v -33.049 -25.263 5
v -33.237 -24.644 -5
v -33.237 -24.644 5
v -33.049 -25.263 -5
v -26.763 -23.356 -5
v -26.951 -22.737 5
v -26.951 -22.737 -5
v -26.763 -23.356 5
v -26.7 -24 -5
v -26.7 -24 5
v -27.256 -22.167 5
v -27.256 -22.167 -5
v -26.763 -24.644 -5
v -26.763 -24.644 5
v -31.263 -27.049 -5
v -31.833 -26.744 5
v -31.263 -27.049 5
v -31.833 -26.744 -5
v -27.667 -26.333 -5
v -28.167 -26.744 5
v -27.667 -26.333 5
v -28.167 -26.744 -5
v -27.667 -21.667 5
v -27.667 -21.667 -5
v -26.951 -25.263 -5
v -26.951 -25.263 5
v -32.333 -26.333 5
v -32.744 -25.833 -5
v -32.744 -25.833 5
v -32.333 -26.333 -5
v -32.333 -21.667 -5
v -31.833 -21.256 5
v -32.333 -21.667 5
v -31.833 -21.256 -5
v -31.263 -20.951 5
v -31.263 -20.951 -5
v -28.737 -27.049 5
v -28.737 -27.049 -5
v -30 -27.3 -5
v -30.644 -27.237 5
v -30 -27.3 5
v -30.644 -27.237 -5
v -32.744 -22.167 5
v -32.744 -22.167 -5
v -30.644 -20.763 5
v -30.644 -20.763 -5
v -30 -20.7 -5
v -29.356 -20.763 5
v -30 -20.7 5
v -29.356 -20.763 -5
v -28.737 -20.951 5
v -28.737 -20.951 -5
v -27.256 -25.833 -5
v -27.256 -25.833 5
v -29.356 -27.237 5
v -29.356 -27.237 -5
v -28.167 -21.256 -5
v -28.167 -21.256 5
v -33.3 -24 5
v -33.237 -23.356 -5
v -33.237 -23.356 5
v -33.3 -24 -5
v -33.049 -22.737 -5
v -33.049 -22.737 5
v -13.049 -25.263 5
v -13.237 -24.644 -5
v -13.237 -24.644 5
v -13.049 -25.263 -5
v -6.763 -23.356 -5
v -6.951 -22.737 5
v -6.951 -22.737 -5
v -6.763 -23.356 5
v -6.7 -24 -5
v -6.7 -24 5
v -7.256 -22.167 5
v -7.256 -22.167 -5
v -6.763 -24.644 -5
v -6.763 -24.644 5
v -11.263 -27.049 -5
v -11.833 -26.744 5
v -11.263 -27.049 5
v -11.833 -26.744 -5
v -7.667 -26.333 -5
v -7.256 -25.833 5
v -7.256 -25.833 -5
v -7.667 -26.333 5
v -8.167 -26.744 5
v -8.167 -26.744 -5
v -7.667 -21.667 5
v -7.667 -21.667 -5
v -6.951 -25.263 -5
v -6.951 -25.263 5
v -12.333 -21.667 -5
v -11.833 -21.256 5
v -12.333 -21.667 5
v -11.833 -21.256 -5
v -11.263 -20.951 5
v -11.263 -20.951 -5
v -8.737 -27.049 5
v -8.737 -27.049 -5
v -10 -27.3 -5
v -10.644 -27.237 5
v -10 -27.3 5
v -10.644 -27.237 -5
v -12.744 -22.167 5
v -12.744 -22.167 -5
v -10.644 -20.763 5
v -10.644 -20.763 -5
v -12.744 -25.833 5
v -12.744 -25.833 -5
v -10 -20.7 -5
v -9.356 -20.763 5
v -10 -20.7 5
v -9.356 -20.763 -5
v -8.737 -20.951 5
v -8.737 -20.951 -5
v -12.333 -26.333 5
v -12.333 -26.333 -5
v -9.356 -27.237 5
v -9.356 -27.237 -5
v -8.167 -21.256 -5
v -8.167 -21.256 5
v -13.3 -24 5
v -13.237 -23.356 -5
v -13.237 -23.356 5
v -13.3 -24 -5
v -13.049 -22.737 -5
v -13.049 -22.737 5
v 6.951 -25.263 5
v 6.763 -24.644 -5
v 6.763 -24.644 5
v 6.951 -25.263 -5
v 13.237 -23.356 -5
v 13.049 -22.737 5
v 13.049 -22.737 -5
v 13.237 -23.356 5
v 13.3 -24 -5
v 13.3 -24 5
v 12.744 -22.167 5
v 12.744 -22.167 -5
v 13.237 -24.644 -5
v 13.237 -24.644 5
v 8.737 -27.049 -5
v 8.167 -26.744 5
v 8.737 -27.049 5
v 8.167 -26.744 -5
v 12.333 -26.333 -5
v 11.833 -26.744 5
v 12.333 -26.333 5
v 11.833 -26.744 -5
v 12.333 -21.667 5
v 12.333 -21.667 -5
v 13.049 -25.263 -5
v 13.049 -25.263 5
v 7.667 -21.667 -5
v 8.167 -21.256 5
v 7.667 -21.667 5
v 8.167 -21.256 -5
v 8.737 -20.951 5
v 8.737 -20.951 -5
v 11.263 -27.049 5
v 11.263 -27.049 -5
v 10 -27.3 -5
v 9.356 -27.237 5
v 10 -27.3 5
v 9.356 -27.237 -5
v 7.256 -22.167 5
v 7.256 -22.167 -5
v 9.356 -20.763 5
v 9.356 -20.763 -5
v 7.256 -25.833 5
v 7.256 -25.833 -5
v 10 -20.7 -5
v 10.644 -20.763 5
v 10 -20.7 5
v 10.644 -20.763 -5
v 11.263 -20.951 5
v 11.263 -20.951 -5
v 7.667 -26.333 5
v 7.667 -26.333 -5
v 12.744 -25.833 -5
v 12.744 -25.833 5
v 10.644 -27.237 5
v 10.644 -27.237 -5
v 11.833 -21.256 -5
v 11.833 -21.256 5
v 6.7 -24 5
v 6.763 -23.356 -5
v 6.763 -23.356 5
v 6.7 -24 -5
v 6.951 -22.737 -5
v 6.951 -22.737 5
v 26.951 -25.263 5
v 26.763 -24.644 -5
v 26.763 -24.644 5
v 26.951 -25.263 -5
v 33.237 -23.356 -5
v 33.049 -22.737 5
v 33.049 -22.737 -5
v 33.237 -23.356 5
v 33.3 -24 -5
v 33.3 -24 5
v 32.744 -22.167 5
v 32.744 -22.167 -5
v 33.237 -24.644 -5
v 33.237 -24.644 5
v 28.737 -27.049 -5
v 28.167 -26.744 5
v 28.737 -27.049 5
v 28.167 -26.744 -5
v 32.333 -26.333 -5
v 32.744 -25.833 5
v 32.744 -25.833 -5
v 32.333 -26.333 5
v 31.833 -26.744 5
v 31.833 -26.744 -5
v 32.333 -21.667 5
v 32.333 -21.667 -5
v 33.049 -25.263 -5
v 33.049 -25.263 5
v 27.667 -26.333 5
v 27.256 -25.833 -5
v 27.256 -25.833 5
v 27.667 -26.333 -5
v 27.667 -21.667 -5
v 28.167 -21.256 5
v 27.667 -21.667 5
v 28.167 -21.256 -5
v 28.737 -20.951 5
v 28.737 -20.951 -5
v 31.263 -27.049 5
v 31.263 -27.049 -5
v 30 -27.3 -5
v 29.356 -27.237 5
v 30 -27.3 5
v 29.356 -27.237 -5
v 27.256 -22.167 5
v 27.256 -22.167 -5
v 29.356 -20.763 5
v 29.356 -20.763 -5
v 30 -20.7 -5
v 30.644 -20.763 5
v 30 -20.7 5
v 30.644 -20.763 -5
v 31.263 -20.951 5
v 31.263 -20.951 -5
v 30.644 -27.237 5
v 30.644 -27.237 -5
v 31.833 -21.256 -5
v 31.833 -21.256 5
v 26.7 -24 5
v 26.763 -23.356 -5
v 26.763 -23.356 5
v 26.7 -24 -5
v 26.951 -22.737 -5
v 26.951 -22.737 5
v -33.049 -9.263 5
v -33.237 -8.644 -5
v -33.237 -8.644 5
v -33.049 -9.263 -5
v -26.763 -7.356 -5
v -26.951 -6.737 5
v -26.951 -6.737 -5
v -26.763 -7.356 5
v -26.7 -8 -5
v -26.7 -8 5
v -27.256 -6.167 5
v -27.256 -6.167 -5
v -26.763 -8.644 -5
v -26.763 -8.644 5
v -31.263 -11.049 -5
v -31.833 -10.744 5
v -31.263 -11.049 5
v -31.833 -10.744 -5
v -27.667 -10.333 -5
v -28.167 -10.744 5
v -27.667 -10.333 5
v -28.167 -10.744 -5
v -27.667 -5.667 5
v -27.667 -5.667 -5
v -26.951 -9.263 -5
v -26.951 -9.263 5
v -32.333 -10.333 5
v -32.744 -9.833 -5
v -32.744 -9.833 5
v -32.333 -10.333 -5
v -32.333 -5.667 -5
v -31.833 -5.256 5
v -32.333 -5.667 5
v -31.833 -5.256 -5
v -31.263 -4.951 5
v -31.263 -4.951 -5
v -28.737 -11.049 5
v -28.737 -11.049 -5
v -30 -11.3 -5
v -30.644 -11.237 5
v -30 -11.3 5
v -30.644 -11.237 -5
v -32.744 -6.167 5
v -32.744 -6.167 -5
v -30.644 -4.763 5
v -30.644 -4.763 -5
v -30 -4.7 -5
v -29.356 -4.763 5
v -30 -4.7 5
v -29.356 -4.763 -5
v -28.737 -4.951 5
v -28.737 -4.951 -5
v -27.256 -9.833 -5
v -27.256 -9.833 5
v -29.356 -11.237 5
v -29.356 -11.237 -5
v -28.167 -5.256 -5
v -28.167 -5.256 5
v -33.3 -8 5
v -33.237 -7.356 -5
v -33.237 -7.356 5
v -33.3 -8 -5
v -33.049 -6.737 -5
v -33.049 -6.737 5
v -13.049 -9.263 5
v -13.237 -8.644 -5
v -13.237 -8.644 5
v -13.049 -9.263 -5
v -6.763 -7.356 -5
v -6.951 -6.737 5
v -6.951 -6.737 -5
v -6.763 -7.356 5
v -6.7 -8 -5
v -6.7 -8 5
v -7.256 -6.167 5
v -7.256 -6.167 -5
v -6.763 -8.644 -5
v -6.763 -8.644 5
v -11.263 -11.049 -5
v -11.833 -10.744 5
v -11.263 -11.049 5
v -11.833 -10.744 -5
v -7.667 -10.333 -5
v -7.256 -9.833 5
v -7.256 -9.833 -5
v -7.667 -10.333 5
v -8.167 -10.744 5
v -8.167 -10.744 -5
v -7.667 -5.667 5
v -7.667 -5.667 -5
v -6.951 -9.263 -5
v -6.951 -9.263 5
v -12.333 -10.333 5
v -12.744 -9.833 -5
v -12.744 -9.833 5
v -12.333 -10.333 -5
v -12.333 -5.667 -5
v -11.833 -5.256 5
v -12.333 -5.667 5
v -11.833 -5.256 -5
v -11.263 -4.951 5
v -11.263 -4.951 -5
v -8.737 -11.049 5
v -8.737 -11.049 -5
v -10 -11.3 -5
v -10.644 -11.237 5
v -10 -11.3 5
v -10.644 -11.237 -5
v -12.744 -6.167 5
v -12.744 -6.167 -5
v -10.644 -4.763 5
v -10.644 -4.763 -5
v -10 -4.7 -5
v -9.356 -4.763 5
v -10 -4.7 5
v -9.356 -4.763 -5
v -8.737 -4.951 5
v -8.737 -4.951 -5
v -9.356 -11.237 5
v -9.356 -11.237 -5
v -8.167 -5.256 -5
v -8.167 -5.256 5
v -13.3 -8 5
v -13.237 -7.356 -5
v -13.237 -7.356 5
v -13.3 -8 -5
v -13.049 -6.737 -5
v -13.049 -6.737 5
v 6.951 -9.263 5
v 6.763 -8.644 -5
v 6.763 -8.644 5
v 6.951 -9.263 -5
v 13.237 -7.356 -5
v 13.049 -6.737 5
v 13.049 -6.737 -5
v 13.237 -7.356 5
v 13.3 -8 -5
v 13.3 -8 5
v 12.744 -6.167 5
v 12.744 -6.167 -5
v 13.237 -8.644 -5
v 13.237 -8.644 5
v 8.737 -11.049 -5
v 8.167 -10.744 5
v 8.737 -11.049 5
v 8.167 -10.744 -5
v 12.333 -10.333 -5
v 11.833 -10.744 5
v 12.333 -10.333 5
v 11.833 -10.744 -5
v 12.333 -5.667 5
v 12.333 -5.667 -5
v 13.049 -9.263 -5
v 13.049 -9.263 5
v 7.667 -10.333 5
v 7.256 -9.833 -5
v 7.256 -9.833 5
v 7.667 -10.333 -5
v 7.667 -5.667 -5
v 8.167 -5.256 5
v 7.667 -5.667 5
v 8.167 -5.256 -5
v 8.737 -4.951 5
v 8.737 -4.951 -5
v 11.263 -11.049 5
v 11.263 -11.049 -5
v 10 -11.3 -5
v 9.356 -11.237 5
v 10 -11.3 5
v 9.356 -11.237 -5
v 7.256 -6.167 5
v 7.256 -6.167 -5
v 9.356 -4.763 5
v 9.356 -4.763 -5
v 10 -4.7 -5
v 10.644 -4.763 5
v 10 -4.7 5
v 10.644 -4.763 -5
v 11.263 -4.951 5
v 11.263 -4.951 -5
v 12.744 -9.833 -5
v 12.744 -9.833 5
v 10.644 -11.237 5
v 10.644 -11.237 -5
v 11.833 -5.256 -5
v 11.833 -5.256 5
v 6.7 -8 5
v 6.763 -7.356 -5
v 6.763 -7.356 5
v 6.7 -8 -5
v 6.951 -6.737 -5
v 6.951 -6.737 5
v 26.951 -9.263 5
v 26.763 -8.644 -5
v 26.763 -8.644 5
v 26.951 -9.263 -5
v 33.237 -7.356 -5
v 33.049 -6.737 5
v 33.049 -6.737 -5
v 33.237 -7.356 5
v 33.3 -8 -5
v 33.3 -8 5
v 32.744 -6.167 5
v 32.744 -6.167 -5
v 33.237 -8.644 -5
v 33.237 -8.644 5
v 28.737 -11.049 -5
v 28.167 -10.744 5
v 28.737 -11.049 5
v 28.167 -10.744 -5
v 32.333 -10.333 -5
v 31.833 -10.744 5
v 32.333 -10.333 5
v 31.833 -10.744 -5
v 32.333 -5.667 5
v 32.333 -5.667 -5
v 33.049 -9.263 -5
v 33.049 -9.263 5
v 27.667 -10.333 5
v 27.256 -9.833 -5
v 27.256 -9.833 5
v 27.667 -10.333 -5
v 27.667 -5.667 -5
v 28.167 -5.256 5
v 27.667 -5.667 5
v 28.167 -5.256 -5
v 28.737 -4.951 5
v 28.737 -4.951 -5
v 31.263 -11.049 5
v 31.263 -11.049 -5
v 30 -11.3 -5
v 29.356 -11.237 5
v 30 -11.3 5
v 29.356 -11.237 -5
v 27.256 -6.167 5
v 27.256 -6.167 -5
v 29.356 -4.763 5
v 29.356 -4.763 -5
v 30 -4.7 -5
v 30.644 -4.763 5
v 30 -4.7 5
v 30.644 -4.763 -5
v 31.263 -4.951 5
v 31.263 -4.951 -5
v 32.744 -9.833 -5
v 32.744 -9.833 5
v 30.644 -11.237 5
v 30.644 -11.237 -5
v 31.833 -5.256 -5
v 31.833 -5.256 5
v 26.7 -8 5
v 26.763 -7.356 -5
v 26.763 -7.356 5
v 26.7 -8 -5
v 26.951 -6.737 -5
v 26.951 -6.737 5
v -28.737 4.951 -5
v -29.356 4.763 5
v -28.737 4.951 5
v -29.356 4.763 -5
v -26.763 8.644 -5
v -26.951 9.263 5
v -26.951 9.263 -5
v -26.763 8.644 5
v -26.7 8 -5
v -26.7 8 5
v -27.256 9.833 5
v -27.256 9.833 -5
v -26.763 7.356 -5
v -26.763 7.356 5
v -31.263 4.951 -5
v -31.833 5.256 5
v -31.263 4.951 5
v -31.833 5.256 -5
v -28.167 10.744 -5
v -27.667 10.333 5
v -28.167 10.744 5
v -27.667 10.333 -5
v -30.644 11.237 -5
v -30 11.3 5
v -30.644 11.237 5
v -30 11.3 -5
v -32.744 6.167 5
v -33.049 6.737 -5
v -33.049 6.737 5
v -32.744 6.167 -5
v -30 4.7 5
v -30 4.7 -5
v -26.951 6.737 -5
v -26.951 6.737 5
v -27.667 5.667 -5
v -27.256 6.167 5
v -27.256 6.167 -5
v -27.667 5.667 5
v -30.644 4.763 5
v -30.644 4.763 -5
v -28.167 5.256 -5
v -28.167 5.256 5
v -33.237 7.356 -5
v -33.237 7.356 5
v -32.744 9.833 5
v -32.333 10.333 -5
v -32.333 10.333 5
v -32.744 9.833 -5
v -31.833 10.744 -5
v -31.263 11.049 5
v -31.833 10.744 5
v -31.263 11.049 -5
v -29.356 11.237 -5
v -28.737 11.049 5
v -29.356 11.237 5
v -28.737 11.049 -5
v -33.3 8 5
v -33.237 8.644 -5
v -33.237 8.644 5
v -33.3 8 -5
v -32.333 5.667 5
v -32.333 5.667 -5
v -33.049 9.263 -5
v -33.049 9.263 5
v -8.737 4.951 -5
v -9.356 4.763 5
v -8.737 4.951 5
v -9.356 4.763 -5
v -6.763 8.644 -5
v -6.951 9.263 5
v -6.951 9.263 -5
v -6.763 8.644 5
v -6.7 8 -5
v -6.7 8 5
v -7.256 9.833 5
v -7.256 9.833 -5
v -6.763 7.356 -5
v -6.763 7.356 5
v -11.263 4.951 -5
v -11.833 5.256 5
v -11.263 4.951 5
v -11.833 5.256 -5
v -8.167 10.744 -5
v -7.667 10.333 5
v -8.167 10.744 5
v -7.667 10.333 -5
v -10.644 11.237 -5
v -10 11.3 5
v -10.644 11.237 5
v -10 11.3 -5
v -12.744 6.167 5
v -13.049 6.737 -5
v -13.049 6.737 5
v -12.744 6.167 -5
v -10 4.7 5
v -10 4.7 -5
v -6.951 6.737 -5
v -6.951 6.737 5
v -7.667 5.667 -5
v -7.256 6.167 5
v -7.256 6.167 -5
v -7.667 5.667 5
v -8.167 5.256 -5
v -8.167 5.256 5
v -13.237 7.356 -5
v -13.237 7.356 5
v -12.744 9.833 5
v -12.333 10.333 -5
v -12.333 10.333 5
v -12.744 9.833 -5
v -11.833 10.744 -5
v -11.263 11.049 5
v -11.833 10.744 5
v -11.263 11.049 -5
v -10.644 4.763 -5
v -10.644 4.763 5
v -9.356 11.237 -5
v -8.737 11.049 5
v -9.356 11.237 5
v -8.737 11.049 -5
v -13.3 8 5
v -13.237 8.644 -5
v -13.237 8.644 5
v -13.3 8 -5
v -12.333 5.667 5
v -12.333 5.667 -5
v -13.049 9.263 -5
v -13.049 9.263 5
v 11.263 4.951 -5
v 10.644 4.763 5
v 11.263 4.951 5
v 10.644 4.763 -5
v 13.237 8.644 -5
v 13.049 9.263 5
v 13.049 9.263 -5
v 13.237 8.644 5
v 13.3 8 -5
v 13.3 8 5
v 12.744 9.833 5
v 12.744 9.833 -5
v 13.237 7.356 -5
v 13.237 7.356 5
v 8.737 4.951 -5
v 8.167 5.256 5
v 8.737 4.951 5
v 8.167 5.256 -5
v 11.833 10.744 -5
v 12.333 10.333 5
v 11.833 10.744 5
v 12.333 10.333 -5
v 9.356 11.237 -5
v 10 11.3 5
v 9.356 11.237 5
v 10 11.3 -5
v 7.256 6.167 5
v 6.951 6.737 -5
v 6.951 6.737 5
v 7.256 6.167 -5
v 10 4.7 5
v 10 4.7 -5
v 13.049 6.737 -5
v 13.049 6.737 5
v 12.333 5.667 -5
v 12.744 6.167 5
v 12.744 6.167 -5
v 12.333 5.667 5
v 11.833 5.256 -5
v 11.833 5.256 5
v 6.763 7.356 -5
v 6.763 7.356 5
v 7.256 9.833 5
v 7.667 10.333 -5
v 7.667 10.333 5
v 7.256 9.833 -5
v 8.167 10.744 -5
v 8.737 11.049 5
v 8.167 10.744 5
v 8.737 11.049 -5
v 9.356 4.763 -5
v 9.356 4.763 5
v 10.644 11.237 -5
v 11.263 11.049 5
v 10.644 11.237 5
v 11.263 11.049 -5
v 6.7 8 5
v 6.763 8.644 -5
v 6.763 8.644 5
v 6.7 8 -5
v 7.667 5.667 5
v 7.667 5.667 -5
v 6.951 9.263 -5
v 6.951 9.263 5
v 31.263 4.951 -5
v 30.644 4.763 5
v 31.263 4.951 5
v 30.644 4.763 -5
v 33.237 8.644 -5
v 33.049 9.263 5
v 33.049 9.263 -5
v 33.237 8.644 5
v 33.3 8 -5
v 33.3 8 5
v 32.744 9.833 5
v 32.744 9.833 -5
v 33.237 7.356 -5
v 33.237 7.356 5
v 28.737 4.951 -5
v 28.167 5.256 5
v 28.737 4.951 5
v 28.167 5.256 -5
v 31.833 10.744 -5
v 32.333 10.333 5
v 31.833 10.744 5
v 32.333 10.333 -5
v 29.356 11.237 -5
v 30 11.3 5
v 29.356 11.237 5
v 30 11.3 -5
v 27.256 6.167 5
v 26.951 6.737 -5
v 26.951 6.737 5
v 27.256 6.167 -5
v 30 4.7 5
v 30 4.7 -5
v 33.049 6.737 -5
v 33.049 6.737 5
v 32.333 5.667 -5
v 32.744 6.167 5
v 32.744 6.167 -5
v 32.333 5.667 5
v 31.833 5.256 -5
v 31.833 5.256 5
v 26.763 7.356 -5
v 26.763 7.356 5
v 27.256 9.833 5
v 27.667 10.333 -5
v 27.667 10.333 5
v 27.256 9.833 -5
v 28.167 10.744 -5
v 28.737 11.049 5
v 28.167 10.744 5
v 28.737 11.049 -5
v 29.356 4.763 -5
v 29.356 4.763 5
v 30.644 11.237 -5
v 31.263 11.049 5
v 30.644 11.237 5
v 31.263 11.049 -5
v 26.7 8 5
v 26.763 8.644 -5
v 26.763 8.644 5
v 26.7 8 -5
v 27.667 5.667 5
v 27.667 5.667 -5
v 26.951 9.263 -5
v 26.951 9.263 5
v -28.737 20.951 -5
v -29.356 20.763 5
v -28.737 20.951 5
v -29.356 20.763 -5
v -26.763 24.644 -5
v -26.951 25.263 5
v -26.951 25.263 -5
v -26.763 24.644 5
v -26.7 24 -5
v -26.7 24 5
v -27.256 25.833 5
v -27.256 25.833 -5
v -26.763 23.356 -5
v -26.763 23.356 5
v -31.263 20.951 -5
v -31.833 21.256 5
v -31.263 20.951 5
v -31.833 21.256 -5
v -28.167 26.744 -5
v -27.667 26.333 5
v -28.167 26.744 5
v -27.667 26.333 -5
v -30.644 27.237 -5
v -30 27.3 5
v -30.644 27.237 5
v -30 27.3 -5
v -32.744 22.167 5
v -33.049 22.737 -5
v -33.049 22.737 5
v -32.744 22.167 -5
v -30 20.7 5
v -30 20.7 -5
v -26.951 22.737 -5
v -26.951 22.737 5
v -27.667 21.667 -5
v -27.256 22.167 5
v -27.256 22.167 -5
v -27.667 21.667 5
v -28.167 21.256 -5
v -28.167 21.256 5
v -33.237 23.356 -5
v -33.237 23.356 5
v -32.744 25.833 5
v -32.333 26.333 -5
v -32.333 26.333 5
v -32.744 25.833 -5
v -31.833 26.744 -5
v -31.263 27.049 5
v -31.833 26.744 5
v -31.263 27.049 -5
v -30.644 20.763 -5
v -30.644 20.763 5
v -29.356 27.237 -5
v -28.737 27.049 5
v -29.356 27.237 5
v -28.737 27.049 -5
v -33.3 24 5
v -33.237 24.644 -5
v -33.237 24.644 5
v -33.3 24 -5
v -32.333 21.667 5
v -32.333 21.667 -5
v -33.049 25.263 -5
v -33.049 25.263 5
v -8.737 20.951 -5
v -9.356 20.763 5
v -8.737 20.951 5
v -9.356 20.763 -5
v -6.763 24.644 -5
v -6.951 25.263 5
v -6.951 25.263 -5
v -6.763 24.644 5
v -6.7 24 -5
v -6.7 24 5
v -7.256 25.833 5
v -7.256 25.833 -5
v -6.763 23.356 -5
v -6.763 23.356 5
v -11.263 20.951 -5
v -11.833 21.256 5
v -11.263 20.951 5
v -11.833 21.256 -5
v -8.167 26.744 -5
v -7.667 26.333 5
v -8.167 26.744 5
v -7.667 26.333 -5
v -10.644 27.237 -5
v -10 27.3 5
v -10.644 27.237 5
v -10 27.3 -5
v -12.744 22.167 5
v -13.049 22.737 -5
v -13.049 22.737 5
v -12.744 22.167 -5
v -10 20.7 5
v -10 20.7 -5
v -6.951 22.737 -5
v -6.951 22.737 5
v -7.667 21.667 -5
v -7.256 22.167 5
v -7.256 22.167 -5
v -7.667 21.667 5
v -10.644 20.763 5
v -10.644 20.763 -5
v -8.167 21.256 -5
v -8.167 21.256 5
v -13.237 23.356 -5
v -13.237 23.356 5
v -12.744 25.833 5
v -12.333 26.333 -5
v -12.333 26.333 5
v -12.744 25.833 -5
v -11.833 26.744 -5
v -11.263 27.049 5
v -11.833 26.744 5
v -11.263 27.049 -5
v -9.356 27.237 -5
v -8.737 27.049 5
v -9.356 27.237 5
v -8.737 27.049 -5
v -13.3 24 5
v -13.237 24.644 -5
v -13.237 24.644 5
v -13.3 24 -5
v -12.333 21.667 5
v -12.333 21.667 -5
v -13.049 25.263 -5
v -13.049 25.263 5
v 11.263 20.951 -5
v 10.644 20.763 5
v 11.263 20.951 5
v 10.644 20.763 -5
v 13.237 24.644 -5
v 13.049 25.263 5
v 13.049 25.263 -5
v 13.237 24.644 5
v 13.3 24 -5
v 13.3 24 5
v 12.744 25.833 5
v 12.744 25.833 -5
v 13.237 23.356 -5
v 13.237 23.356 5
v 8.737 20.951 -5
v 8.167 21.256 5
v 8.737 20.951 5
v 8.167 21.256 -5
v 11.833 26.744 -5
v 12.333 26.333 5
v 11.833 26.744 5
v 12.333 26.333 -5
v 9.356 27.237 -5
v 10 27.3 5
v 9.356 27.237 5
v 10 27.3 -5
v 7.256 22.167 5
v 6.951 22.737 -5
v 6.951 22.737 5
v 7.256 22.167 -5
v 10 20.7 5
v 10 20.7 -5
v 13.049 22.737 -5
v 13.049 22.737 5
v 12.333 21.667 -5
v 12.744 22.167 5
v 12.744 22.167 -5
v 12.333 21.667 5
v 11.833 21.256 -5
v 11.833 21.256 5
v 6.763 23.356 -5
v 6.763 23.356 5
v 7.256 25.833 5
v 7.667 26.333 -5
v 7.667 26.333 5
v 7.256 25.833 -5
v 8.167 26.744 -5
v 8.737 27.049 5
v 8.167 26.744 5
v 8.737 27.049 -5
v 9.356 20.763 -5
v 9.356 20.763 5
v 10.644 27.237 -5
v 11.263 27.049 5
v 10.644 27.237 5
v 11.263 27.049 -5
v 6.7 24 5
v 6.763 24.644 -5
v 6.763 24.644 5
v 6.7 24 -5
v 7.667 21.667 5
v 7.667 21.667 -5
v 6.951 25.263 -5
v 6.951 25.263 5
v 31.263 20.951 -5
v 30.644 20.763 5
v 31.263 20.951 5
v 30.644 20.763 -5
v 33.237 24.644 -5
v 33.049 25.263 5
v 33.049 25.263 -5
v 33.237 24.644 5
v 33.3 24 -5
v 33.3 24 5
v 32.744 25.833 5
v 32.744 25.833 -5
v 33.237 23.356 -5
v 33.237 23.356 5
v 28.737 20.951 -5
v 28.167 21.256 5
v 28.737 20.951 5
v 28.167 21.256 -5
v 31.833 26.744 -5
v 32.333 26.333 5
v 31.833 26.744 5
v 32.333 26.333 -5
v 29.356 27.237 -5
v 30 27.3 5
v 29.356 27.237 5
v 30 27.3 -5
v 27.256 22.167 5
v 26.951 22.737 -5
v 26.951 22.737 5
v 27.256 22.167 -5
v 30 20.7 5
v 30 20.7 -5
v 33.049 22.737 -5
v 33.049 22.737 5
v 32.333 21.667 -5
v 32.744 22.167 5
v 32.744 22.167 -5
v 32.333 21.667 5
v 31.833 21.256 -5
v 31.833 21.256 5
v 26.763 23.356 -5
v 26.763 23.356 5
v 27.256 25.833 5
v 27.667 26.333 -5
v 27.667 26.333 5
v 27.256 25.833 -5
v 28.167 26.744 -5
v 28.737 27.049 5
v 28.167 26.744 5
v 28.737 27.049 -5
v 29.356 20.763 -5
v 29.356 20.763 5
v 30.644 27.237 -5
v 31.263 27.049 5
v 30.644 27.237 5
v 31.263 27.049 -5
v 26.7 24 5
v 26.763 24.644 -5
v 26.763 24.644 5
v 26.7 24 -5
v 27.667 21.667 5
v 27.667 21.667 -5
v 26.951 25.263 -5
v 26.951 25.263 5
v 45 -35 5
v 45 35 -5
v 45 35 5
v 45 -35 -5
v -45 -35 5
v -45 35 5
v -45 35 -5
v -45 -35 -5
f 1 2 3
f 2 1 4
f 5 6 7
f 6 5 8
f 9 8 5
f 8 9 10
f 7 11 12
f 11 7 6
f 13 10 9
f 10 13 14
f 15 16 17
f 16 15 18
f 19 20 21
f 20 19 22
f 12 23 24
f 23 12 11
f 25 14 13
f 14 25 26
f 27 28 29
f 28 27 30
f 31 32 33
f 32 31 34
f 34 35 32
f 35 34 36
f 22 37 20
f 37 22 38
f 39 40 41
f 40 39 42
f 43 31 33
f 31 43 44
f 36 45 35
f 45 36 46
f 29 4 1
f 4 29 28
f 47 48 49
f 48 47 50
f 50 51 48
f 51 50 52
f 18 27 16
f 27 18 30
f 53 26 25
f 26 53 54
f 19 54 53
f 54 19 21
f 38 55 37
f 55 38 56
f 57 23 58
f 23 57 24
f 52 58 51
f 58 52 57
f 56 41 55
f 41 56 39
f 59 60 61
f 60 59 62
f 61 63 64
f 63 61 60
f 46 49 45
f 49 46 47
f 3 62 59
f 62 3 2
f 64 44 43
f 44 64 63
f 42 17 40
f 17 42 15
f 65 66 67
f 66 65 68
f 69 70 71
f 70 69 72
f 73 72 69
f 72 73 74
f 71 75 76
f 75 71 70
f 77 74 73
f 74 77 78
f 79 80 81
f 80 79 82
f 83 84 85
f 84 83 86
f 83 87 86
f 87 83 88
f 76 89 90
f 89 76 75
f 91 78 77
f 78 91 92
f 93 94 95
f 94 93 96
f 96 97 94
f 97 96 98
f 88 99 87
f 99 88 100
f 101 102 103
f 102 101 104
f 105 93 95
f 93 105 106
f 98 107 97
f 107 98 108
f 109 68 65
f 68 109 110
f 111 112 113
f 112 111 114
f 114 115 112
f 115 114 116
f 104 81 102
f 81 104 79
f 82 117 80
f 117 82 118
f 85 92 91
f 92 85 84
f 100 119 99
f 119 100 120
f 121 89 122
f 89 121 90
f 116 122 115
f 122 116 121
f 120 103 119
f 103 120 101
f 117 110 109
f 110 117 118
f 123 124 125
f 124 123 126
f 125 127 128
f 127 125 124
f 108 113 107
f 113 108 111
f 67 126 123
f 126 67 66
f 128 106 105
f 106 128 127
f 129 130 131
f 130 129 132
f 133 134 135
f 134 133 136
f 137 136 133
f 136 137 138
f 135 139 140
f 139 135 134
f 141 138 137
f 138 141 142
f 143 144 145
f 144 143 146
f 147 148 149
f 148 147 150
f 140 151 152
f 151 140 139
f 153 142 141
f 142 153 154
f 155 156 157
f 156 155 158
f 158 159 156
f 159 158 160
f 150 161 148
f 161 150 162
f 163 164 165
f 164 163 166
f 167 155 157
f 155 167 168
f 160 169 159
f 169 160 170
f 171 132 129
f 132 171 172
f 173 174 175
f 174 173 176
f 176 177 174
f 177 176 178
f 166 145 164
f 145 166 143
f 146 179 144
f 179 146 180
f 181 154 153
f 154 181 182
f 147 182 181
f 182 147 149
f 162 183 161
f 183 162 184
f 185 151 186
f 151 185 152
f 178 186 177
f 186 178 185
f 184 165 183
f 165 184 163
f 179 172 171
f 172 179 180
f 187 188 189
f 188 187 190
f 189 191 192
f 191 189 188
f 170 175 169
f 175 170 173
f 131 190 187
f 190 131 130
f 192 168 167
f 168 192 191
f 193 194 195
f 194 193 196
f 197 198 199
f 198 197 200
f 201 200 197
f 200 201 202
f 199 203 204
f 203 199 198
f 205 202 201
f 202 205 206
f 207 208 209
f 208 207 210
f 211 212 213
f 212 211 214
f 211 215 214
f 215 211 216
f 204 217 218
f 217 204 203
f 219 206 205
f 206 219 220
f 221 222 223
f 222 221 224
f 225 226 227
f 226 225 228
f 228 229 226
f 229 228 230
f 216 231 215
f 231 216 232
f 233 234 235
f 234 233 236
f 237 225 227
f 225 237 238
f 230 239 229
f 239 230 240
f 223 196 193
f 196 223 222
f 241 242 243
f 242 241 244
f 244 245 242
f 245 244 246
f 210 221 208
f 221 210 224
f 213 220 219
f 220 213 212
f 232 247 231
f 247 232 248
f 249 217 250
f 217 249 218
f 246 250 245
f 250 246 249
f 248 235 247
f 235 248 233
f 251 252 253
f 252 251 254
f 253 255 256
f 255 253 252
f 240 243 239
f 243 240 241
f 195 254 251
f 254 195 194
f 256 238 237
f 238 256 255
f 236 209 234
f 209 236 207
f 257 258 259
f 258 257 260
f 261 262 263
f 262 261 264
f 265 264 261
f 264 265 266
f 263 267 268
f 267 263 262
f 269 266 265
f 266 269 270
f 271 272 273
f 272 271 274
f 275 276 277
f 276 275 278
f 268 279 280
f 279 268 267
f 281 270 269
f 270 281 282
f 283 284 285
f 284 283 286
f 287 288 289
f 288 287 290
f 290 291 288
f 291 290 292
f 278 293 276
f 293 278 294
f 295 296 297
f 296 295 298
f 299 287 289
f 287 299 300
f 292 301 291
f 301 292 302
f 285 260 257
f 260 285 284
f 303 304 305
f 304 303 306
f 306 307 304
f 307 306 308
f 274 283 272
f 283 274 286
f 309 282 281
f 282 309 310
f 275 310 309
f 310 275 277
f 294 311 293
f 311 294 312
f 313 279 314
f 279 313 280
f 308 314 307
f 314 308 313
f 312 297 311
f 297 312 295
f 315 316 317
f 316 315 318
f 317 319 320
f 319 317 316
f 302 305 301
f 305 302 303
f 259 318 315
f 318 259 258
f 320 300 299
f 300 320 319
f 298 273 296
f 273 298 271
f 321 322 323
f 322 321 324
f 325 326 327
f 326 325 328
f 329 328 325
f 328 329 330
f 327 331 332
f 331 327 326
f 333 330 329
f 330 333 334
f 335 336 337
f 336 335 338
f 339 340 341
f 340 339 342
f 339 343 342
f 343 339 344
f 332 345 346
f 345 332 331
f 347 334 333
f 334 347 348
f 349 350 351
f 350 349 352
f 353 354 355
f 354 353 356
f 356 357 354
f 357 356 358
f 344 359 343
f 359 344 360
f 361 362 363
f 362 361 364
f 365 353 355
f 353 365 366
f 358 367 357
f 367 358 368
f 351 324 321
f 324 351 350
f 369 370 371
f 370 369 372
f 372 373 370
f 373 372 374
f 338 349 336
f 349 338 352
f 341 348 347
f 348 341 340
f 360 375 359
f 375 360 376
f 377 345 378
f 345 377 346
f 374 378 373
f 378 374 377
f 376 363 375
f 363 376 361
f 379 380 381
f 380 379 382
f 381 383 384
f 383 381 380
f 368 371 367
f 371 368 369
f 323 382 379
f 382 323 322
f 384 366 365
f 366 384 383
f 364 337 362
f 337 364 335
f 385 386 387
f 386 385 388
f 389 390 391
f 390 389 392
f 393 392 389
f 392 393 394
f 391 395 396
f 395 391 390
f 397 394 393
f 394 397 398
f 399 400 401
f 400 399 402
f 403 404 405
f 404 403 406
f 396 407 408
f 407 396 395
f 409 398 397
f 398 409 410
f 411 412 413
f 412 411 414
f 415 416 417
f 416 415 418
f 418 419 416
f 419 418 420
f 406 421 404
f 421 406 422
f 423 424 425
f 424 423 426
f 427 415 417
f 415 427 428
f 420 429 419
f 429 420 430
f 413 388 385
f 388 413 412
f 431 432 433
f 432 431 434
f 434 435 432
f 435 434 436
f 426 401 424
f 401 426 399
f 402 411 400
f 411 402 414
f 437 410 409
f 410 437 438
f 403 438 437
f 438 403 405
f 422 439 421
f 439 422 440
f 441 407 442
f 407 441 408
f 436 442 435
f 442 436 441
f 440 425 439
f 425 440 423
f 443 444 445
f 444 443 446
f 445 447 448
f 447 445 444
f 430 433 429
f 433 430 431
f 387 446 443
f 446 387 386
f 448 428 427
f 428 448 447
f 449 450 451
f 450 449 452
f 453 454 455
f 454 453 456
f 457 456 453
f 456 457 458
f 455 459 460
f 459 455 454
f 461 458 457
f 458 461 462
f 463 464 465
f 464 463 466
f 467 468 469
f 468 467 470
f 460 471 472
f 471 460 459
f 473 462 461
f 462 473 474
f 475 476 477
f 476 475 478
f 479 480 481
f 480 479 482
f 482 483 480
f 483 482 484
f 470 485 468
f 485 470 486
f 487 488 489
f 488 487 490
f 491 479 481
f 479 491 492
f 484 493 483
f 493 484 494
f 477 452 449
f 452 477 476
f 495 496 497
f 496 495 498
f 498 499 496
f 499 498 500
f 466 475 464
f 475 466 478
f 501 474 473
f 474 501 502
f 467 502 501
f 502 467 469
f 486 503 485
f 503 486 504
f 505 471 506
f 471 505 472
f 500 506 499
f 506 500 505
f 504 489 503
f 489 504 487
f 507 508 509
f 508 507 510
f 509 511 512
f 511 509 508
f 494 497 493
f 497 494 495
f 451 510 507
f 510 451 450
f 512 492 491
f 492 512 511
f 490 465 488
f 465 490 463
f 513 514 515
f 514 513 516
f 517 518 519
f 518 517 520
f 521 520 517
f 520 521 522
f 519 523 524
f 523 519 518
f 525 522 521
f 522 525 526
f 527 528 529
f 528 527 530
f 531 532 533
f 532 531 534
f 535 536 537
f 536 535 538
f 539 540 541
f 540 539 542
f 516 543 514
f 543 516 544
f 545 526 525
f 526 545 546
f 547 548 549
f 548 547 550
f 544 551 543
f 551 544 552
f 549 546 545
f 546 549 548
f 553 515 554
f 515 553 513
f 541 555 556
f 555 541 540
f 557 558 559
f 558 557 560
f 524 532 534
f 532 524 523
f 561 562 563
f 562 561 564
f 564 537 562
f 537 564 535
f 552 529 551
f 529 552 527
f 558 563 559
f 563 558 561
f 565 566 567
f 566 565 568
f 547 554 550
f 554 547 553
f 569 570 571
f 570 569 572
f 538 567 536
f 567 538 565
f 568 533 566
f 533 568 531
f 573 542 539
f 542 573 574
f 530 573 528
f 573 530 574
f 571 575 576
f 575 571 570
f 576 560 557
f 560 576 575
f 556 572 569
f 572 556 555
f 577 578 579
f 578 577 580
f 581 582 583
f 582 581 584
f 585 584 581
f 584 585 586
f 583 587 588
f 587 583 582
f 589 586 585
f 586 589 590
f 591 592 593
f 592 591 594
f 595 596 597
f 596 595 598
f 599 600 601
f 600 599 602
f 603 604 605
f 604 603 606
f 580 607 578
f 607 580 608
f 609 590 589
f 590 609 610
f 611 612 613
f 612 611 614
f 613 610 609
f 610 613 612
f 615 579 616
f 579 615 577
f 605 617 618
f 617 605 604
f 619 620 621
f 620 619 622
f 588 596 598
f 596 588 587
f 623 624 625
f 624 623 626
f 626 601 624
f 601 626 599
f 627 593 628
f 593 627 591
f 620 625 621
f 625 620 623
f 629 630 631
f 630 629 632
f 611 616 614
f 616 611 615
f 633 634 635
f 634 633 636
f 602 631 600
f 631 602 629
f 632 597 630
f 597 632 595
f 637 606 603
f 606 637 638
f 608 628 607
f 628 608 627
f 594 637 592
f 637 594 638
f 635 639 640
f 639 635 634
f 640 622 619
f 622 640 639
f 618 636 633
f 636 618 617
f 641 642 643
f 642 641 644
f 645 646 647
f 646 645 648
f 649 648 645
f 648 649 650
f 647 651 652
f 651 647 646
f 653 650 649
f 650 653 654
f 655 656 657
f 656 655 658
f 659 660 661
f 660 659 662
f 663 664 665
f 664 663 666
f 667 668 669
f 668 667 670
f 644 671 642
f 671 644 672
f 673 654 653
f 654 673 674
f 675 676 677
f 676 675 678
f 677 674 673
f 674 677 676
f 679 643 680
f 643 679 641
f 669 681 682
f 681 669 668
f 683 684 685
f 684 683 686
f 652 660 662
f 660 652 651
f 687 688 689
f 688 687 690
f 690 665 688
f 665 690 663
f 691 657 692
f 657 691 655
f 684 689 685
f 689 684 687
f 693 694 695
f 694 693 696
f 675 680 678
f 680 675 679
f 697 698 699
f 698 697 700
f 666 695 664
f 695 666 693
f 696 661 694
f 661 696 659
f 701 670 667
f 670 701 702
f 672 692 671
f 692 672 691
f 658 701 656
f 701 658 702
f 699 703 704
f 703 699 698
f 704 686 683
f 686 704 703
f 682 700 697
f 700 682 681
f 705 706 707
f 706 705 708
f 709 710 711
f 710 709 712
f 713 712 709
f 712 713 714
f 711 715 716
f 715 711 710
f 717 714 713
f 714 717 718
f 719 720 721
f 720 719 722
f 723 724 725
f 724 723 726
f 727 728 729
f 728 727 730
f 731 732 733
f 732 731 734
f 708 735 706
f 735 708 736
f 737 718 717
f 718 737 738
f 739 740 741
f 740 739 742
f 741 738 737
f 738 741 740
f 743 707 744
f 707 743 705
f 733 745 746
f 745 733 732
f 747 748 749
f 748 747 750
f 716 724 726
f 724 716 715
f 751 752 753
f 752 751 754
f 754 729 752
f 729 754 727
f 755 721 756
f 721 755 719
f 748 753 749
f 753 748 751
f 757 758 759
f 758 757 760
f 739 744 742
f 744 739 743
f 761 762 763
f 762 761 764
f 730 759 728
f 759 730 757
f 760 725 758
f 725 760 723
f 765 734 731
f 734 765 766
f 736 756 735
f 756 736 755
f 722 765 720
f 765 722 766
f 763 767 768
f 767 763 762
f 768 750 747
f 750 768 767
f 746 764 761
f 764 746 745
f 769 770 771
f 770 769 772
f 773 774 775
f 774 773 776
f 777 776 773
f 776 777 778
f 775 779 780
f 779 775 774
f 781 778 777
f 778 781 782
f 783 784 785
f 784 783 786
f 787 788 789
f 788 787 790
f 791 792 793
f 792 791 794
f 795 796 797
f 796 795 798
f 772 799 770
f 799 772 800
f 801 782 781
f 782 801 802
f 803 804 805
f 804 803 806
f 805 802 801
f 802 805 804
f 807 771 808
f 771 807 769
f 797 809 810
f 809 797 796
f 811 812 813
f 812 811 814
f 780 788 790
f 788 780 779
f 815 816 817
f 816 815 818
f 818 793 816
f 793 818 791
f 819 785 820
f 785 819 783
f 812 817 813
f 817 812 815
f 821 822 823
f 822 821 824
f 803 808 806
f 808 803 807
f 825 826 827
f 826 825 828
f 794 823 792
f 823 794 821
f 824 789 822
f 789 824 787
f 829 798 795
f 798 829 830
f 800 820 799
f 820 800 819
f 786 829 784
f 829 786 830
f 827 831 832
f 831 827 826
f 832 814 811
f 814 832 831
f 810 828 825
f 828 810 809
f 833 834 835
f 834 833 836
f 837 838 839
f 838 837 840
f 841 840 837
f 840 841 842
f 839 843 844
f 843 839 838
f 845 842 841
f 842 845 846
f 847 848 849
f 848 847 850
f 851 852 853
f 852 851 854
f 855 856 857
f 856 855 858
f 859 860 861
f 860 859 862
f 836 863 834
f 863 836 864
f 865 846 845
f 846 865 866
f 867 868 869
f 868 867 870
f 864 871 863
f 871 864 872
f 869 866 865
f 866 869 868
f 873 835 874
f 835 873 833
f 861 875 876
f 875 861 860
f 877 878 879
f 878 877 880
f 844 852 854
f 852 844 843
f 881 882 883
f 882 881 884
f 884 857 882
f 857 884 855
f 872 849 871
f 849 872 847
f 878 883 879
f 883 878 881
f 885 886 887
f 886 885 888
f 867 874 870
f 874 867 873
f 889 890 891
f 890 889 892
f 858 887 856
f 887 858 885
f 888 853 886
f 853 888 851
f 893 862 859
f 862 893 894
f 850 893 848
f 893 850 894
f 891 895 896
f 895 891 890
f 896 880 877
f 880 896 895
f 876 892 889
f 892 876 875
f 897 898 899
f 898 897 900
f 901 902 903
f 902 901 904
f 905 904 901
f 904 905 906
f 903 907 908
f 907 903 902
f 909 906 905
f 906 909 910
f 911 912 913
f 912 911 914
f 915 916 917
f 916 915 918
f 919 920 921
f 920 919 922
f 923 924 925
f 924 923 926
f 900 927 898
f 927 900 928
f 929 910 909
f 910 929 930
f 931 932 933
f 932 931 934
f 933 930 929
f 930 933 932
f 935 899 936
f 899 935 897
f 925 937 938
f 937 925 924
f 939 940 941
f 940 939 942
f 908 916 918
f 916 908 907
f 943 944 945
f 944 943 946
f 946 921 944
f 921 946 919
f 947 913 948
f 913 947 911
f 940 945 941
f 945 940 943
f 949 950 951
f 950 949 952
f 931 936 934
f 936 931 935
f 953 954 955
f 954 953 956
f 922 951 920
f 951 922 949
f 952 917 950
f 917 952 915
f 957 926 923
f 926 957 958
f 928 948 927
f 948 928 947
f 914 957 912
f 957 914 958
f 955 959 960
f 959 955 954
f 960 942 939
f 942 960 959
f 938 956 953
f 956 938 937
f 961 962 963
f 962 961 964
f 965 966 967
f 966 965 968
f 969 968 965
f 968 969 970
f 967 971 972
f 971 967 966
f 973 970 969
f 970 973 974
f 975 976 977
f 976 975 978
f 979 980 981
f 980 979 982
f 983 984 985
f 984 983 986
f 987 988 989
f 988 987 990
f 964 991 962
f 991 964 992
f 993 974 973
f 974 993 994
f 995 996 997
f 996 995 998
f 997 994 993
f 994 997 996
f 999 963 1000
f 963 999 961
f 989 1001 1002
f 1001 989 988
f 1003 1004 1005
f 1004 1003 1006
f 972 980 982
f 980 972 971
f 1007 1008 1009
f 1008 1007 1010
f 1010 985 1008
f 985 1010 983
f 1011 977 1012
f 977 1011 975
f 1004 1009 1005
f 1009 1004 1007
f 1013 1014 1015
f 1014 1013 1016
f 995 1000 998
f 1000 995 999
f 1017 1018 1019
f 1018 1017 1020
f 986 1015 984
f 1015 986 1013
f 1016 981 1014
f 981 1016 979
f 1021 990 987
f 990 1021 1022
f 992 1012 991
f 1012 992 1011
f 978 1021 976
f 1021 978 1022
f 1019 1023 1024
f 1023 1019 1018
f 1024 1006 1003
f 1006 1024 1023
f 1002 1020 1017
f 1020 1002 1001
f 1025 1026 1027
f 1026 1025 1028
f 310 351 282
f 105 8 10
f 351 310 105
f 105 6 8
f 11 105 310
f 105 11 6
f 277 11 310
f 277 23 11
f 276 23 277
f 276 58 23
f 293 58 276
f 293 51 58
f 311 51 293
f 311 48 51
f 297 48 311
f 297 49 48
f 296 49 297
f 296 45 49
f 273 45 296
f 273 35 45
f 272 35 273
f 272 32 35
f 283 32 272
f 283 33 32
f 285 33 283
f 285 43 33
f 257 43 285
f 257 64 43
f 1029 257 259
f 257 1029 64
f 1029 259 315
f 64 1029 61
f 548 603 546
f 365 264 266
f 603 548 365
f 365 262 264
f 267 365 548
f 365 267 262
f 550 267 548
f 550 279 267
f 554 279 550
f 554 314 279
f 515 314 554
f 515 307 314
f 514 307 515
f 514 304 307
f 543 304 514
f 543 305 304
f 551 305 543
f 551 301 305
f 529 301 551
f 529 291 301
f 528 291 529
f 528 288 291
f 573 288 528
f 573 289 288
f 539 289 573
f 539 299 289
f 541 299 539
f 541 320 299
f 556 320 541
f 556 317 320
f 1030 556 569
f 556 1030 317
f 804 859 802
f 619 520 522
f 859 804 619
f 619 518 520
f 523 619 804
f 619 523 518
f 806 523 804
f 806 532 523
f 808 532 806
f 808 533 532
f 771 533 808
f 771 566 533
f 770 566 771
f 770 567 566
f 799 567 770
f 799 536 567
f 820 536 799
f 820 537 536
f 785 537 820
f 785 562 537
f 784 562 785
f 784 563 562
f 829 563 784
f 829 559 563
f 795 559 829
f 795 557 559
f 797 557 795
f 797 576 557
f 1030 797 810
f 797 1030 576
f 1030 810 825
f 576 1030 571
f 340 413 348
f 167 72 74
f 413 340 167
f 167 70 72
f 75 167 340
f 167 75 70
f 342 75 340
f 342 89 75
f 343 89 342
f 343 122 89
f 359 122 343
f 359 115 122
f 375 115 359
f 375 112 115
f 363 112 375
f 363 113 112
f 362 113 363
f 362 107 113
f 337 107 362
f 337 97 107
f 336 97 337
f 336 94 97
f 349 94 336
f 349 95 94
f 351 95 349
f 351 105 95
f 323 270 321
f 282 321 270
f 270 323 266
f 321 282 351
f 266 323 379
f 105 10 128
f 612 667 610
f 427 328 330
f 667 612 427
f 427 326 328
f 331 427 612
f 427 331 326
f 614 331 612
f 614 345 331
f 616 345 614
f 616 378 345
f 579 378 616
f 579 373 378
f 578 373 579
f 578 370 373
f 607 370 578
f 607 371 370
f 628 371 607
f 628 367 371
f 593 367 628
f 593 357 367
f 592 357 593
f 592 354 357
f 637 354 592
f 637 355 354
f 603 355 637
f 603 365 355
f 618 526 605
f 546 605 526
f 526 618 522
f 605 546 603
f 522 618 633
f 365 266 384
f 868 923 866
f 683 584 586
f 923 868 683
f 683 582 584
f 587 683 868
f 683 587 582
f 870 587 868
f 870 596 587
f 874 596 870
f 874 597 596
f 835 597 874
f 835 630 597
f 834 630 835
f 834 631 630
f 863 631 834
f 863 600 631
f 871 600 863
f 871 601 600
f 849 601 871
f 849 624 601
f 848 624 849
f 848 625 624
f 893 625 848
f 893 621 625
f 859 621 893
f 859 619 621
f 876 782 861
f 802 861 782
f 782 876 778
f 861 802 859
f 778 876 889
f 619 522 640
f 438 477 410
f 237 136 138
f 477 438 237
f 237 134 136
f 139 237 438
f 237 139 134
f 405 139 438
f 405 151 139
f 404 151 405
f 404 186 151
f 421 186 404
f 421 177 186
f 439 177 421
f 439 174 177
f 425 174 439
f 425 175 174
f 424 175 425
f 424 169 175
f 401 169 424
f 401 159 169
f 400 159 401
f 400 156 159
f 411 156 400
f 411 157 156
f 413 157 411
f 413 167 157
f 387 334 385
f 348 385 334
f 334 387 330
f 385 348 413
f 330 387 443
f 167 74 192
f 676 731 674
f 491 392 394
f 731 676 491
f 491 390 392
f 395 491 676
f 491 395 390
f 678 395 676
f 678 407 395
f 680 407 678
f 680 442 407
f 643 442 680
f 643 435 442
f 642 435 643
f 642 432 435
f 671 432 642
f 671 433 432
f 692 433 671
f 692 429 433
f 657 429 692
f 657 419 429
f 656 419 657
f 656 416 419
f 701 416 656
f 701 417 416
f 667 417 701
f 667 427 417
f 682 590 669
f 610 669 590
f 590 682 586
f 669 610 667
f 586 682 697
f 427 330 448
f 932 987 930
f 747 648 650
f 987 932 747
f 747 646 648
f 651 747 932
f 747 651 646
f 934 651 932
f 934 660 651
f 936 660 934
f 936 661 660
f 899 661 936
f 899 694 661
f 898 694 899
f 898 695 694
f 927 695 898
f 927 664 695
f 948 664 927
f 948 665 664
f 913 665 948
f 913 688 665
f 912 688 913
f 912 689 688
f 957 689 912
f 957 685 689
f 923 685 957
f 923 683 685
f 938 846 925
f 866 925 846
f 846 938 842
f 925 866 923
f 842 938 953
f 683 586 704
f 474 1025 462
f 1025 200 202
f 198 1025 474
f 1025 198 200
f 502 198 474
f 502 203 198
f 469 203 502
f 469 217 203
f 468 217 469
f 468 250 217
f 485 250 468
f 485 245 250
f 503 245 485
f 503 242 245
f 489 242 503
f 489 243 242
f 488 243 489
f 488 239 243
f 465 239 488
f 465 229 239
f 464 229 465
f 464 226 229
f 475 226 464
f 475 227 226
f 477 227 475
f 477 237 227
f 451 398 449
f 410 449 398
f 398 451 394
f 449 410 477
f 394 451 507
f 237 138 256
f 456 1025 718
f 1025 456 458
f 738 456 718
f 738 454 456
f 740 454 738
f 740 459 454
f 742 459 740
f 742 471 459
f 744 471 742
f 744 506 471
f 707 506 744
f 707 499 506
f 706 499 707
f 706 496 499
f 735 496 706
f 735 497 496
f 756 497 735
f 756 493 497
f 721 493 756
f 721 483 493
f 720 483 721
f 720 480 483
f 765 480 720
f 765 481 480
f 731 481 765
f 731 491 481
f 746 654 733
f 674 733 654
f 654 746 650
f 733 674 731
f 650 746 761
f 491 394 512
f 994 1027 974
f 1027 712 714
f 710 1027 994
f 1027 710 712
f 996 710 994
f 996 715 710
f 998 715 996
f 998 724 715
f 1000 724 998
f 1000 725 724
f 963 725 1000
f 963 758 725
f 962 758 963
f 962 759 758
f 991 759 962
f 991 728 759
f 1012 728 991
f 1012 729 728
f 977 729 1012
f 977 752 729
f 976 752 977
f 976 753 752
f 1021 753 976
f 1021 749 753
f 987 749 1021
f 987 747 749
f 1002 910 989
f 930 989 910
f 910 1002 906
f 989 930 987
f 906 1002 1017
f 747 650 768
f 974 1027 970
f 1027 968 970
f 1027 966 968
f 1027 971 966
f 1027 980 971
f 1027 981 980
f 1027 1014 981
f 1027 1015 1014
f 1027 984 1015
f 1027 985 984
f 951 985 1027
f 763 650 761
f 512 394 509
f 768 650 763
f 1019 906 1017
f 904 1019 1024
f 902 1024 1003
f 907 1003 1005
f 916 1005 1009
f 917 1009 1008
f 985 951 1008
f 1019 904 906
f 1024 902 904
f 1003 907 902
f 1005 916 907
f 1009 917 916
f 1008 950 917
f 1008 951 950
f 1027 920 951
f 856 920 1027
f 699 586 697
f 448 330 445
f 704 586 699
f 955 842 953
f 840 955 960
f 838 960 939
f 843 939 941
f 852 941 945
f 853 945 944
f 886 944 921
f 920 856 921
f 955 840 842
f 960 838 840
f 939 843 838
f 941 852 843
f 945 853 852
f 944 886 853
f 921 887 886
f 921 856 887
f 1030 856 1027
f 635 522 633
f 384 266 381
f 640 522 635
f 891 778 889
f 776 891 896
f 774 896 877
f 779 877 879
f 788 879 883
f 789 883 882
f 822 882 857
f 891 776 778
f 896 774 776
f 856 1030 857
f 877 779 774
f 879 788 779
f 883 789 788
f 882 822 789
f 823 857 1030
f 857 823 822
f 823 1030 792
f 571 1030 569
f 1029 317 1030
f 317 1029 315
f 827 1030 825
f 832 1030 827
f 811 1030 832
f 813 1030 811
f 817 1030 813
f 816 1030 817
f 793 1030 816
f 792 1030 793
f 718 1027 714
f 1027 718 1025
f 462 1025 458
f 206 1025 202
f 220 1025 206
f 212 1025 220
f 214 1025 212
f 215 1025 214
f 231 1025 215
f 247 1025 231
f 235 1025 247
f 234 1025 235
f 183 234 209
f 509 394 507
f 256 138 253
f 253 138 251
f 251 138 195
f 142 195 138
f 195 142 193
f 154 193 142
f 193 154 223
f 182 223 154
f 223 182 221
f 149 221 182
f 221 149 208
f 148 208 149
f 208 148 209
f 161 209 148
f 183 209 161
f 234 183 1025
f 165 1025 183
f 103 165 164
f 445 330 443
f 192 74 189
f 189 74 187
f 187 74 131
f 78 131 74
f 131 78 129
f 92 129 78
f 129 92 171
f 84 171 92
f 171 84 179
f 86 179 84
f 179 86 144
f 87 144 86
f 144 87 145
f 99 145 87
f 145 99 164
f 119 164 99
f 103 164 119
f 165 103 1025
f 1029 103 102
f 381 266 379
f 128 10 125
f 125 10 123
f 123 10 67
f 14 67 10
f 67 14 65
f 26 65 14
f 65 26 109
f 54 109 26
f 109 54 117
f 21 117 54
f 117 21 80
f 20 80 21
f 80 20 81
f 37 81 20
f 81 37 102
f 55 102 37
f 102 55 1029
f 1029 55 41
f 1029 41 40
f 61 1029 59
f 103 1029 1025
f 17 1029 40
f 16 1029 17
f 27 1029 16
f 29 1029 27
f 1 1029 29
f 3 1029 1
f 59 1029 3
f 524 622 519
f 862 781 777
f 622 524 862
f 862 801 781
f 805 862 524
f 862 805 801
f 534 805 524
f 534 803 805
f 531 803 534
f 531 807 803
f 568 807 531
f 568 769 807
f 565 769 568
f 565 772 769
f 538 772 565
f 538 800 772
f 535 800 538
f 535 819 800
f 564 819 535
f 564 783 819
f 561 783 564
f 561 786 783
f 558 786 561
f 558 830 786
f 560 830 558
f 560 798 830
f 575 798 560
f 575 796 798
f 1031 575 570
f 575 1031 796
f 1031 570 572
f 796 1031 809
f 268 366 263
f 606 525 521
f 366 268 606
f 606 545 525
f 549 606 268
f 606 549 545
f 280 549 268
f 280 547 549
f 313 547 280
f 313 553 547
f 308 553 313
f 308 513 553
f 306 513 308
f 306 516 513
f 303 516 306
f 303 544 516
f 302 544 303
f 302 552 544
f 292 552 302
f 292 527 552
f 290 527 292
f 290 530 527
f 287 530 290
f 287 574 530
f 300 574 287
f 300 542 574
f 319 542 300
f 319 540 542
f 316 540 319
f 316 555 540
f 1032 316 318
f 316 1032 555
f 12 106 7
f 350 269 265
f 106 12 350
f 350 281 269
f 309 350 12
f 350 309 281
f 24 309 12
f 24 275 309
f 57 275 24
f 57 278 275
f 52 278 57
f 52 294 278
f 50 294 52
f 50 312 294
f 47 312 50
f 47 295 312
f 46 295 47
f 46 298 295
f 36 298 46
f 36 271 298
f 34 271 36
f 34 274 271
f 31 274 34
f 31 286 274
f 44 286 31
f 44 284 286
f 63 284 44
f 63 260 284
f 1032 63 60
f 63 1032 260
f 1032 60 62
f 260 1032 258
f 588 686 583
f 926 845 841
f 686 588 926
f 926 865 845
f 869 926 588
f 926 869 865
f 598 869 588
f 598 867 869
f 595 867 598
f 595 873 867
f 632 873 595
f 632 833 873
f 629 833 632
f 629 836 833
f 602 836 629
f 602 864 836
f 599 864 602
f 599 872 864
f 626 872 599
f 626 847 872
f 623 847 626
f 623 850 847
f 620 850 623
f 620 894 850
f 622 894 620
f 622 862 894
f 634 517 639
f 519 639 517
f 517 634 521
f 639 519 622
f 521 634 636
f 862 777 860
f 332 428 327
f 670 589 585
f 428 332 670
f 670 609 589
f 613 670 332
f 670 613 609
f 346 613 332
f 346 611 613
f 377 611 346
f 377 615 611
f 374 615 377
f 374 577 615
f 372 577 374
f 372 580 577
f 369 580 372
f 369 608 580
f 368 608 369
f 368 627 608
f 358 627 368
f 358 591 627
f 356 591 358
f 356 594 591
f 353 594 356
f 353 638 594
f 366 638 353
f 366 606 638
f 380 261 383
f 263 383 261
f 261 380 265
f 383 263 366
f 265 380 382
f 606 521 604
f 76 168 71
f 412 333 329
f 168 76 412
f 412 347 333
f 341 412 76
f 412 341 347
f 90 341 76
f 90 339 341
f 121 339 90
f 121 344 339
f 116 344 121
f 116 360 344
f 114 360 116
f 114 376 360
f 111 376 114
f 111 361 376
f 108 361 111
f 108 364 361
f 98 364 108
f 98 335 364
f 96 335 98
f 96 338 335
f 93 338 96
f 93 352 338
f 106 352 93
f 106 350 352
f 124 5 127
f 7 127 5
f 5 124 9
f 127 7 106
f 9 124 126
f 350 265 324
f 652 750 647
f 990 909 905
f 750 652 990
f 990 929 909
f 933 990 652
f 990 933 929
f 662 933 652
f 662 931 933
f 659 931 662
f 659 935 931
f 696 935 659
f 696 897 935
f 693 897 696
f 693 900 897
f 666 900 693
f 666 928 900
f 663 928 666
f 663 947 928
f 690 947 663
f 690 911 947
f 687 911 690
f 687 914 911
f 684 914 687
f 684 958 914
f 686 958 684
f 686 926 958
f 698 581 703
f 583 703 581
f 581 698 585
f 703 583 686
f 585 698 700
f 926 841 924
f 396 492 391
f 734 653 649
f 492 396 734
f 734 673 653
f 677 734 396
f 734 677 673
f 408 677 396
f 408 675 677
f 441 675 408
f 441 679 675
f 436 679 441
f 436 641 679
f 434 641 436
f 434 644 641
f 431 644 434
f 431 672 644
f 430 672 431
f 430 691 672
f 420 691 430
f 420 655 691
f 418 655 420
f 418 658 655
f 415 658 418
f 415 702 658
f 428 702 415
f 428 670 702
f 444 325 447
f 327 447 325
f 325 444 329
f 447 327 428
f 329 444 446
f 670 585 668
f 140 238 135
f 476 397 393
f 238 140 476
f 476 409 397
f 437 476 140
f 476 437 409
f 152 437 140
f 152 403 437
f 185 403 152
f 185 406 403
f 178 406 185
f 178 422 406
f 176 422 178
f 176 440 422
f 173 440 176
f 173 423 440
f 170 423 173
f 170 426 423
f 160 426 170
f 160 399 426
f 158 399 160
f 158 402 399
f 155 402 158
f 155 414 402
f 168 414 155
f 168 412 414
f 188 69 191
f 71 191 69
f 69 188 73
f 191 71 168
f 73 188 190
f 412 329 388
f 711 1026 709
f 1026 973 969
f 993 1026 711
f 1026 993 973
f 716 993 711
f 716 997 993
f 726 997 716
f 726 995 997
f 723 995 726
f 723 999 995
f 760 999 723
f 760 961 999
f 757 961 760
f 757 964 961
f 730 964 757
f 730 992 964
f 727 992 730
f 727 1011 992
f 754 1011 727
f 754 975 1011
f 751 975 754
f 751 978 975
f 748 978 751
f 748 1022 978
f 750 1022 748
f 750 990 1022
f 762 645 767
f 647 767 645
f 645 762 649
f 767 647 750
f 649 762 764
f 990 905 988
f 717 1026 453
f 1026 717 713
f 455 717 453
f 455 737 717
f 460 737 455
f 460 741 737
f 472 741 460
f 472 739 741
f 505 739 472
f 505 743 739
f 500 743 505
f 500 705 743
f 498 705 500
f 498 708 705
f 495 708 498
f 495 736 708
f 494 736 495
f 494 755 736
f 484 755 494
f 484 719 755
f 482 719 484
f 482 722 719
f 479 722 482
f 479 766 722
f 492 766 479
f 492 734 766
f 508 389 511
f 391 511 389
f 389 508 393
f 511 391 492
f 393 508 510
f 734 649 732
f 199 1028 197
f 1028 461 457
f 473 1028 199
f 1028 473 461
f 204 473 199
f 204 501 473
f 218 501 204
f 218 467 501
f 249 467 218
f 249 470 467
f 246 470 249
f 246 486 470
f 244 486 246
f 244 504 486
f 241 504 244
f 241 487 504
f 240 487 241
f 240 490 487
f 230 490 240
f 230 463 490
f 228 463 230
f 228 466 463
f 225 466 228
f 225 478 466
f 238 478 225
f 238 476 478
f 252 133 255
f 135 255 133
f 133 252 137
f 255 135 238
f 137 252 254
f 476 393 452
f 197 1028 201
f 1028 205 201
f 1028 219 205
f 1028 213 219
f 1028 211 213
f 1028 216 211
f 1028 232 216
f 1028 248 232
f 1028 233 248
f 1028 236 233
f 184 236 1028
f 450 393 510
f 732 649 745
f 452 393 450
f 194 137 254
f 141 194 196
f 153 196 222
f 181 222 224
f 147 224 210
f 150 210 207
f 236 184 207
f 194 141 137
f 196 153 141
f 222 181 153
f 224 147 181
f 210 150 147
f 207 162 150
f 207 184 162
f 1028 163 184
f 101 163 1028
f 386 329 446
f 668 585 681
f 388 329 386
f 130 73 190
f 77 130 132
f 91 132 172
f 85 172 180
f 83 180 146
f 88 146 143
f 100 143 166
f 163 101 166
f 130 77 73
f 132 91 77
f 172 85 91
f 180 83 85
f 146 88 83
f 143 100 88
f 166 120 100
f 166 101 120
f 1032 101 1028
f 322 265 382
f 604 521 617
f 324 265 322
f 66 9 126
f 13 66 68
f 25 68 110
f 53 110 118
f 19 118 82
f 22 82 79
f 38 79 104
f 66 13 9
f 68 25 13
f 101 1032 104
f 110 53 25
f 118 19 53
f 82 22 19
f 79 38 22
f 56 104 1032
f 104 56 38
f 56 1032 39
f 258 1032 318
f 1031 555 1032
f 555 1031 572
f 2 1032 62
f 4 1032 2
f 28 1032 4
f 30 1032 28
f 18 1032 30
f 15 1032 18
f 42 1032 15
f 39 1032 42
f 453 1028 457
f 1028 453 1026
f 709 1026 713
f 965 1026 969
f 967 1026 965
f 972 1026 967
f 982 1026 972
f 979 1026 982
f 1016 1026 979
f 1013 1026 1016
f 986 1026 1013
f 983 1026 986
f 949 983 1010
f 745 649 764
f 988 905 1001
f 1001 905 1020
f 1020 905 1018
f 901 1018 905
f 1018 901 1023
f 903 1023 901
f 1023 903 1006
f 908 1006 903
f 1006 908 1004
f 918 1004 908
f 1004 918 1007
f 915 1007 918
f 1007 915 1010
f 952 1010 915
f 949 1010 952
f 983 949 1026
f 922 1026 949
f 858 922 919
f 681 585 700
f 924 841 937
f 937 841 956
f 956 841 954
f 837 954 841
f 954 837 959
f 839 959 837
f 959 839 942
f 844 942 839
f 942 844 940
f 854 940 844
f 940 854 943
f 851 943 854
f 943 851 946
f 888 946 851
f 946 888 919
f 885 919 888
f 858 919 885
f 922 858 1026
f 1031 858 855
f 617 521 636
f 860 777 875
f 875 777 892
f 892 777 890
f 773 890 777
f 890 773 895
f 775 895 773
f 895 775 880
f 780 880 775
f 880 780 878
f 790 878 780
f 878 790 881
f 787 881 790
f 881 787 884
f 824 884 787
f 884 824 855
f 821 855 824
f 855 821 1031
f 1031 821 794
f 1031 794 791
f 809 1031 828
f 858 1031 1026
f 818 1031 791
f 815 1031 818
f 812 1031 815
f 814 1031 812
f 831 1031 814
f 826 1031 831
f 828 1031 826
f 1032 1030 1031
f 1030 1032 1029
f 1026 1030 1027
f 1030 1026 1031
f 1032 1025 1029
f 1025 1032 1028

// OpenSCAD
$fn = 32;

// ----------------------------------------------------------------------
// Perforated panel 90 x 70 x 10
// 4 x 4 Ø6.6 holes, grid layout
// ----------------------------------------------------------------------

// --- parameters (mm) ---
panel = [90, 70, 10];  // overall size (x, y, z)
seat_tol = 0.1;        // tolerance at the seating features
free_tol = 0.5;        // general tolerance on the free sizes
hole_d = 6.6;          // hole diameter
pitch_x = 20;          // hole pitch along X
pitch_y = 16;          // hole pitch along Y

// --- derived feature positions (mm) ---
margin = hole_d / 2 + 2;            // = 5.3   clearance from the panel edge
cols = floor((panel[0] - 2 * margin) / pitch_x) + 1;  // = 4   how many columns fit in X
rows = floor((panel[1] - 2 * margin) / pitch_y) + 1;  // = 4   how many rows fit in Y
span_x = (cols - 1) * pitch_x + 0;  // = 60   width of the field
span_y = (rows - 1) * pitch_y;      // = 48   height of the field
origin_x = -span_x / 2;             // = -30   X of the first hole
origin_y = -span_y / 2;             // = -24   Y of the first row
holes = rows * cols;                // = 16   holes in total
feature_centers = [
  [origin_x + 0 * pitch_x, origin_y + 0 * pitch_y],
  [origin_x + 1 * pitch_x, origin_y + 0 * pitch_y],
  [origin_x + 2 * pitch_x, origin_y + 0 * pitch_y],
  [origin_x + 3 * pitch_x, origin_y + 0 * pitch_y],
  [origin_x + 0 * pitch_x, origin_y + 1 * pitch_y],
  [origin_x + 1 * pitch_x, origin_y + 1 * pitch_y],
  [origin_x + 2 * pitch_x, origin_y + 1 * pitch_y],
  [origin_x + 3 * pitch_x, origin_y + 1 * pitch_y],
  [origin_x + 0 * pitch_x, origin_y + 2 * pitch_y],
  [origin_x + 1 * pitch_x, origin_y + 2 * pitch_y],
  [origin_x + 2 * pitch_x, origin_y + 2 * pitch_y],
  [origin_x + 3 * pitch_x, origin_y + 2 * pitch_y],
  [origin_x + 0 * pitch_x, origin_y + 3 * pitch_y],
  [origin_x + 1 * pitch_x, origin_y + 3 * pitch_y],
  [origin_x + 2 * pitch_x, origin_y + 3 * pitch_y],
  [origin_x + 3 * pitch_x, origin_y + 3 * pitch_y]
];   // hole centres, used verbatim by the cutter loop

// panel outline, every hole through
difference() {
  cube(panel, center = true);
  for (centre = feature_centers)
    translate([centre[0], centre[1], 0])
      cylinder(d = hole_d, h = panel[2] + 2, center = true);
}
